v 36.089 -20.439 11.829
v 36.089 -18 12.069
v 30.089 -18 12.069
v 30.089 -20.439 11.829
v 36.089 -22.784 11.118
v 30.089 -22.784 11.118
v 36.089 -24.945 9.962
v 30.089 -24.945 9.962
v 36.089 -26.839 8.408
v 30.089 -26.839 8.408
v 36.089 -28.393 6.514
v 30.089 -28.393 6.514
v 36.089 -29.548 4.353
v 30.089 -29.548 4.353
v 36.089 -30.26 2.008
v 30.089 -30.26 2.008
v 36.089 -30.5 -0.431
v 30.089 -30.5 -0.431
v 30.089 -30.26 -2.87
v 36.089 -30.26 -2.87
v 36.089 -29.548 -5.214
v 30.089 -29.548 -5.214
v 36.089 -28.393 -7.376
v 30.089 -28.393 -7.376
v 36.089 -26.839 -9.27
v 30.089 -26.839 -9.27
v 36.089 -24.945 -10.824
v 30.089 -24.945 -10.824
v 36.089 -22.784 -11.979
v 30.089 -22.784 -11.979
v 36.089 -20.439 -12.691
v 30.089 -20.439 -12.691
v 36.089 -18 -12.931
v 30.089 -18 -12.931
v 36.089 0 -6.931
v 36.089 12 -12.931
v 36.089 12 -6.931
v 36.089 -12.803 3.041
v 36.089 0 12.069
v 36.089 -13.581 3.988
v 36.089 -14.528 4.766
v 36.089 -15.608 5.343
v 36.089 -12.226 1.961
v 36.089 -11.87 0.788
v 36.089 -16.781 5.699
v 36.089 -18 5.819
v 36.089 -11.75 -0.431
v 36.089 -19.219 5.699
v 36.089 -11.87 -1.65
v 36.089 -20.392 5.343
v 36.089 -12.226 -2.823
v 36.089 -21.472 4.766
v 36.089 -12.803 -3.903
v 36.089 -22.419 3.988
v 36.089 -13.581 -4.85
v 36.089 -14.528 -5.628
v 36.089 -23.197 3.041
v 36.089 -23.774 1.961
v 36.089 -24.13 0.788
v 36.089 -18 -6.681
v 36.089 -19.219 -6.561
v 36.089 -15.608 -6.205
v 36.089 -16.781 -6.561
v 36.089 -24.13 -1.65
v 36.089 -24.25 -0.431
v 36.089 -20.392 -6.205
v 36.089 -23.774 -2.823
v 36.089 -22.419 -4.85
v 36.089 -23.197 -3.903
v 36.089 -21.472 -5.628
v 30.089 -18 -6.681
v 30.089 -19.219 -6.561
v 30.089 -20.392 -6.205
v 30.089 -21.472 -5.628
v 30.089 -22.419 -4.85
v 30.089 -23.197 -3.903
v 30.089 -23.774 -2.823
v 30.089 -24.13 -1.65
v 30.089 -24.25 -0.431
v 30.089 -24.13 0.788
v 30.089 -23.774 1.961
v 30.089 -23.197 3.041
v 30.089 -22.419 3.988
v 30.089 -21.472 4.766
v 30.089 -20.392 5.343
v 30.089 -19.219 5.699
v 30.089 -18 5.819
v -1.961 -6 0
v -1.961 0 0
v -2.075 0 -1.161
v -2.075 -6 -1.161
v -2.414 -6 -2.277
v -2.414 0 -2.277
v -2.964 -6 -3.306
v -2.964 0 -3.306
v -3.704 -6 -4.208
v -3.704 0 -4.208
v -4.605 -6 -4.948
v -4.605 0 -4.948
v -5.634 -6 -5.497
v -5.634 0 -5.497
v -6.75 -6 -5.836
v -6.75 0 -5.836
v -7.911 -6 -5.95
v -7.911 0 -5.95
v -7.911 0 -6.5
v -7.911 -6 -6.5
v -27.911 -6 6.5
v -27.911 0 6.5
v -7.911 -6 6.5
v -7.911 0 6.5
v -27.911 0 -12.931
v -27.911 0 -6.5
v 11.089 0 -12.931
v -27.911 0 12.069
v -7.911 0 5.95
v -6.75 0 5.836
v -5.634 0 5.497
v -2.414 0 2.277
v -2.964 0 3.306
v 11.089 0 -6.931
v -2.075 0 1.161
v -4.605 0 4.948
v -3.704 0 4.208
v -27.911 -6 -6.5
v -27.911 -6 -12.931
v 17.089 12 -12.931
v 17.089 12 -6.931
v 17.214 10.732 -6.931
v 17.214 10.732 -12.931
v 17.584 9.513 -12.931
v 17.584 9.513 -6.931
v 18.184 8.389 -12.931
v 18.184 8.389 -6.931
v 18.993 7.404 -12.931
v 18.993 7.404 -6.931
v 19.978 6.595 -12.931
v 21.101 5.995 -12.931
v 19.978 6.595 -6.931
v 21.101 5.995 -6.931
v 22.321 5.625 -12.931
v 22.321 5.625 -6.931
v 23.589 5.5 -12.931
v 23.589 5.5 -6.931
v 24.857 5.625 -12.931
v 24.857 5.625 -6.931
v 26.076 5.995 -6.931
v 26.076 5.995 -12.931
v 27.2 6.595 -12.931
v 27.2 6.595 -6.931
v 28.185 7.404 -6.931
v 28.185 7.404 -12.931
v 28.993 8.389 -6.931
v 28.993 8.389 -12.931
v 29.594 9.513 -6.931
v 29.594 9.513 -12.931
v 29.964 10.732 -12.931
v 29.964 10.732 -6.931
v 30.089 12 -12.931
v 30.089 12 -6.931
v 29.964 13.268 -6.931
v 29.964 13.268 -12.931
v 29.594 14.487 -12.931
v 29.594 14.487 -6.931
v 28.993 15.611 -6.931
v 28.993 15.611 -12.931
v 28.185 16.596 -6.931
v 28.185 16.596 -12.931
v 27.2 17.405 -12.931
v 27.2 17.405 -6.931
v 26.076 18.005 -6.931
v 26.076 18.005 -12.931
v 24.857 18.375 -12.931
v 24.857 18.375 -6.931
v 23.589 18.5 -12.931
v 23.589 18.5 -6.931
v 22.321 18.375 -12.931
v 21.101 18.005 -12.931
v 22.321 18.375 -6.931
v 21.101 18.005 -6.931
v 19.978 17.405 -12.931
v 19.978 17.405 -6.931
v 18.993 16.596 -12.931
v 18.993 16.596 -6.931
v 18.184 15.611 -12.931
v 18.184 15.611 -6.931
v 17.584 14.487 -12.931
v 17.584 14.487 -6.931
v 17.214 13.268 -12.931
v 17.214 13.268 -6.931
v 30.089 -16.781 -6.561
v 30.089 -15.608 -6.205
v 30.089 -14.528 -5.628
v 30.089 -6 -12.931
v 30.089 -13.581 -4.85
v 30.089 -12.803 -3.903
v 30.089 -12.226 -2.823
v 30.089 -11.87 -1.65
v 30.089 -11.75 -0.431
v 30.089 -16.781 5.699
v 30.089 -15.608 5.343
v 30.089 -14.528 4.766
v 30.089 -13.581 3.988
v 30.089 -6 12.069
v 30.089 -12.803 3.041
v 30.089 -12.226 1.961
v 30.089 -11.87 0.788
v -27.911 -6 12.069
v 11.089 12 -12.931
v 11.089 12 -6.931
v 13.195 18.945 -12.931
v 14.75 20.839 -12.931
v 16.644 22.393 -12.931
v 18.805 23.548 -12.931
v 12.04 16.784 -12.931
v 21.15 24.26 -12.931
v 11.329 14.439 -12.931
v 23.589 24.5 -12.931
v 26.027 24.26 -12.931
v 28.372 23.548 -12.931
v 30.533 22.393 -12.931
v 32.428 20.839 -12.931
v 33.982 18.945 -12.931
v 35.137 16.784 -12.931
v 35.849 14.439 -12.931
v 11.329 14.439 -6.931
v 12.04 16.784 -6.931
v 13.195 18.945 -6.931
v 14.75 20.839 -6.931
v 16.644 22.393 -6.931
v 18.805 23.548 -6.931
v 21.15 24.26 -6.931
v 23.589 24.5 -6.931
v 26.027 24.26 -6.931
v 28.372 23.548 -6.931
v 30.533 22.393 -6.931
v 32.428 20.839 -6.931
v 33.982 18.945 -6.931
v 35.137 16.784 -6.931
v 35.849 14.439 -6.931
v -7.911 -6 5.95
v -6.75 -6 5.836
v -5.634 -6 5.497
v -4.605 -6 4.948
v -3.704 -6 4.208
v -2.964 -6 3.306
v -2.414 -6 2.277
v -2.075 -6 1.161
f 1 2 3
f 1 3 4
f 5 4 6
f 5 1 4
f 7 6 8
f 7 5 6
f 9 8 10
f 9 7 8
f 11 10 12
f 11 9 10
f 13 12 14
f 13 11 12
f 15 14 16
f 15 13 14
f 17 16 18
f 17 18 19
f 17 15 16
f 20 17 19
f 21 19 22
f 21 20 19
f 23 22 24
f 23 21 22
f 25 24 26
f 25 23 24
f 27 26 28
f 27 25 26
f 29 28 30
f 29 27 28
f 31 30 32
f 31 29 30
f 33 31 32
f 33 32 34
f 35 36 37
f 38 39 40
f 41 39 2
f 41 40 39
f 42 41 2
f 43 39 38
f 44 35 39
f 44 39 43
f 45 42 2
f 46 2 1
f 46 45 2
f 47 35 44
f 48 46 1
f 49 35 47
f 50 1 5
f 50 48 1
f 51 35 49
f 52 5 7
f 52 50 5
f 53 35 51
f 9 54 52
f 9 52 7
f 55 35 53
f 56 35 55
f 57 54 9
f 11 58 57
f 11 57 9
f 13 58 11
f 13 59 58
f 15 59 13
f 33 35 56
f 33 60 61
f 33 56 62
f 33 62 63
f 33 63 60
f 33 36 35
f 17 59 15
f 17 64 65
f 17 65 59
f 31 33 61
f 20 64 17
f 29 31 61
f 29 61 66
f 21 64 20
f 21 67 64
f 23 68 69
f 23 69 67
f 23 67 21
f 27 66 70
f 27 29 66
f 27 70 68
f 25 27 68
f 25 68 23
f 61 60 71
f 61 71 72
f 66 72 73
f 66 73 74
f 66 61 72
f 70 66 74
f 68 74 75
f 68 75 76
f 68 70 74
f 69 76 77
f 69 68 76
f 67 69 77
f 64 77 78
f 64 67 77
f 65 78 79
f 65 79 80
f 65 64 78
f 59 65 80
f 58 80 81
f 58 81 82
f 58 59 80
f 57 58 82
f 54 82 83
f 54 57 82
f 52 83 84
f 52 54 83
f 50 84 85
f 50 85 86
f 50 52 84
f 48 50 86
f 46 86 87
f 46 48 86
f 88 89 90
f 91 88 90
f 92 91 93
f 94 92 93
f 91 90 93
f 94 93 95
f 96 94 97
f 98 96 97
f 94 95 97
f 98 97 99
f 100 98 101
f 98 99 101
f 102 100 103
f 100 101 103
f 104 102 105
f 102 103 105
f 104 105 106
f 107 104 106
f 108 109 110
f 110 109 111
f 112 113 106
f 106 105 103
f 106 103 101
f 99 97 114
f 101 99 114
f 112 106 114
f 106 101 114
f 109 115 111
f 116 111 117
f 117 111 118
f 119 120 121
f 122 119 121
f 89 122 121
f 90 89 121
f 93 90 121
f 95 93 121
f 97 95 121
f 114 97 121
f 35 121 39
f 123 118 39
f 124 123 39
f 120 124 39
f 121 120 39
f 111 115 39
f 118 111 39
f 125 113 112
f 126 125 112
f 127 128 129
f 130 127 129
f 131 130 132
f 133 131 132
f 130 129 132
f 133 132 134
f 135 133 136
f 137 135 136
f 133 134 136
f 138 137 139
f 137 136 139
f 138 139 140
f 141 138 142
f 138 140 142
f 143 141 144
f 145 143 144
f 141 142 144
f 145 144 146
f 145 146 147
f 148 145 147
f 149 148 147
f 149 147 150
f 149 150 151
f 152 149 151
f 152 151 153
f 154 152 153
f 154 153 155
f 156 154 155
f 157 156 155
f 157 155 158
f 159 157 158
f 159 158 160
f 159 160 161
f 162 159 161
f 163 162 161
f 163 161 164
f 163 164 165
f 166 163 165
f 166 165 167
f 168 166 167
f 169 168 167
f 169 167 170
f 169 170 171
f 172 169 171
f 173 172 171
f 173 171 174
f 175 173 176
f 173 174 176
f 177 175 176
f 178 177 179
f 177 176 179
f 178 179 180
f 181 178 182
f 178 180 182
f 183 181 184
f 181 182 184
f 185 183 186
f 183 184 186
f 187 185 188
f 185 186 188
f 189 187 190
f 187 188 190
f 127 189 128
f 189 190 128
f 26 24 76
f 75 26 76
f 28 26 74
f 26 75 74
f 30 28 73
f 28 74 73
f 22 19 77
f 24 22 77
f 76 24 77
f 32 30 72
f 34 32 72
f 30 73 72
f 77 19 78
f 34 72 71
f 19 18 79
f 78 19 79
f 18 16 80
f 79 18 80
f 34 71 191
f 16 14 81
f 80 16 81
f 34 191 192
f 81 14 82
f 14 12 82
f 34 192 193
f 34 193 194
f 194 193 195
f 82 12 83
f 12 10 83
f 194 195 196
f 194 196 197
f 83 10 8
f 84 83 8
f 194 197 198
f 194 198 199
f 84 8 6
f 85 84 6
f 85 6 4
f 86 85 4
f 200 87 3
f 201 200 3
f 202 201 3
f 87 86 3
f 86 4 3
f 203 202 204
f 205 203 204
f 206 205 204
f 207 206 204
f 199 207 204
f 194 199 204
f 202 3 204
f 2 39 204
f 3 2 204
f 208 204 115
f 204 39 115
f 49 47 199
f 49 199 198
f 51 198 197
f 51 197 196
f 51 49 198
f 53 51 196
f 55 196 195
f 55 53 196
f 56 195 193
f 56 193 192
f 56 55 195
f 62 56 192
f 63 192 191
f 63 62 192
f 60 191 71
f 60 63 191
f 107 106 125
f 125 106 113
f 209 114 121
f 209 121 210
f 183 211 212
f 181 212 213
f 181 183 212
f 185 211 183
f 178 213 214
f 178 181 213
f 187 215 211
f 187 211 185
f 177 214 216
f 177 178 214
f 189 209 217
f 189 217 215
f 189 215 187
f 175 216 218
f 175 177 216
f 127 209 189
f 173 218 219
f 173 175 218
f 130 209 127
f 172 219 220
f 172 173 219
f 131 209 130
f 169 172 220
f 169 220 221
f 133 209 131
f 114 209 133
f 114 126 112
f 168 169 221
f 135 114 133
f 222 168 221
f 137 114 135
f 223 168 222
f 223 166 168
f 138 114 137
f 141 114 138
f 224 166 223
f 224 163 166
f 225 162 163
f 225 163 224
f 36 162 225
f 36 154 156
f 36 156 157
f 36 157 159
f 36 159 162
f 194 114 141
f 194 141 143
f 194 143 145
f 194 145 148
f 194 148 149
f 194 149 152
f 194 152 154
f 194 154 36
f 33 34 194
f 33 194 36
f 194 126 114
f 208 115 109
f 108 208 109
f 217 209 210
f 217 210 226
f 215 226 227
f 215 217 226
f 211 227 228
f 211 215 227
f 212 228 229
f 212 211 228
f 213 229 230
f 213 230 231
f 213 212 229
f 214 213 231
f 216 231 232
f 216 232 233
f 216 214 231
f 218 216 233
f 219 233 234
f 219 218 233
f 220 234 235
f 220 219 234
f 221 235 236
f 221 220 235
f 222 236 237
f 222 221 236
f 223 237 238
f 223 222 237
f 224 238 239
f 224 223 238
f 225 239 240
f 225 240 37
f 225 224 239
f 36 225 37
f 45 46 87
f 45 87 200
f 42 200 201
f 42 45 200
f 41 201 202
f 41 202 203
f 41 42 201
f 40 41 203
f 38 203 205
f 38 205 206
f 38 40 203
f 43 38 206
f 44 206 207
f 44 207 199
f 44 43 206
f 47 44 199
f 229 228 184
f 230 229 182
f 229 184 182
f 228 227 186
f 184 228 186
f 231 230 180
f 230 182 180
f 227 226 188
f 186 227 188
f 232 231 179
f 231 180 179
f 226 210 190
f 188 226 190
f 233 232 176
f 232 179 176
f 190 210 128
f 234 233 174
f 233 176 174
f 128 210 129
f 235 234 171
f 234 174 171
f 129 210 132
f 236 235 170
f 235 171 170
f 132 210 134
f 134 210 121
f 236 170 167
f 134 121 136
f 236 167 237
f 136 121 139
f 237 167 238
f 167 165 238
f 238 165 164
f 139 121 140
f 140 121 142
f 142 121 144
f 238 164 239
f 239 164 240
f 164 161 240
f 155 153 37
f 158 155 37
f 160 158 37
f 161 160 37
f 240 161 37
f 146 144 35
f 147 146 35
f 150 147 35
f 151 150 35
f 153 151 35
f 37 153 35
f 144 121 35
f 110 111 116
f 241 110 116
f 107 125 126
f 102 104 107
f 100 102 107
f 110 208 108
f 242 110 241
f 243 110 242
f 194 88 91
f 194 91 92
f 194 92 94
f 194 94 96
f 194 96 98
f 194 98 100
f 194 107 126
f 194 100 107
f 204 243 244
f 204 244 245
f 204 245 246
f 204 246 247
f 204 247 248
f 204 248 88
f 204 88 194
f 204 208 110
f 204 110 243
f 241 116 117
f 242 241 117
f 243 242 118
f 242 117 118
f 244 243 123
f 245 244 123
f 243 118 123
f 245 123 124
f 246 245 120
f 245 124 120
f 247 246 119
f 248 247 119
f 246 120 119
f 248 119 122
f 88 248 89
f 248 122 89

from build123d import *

# Parameters (mm, degrees)
F1_DEPTH = 6
F3_DEPTH = 6
F4_W     = 25
F4_H     = 12
F4_H_2   = 18
F5_DEPTH = 6
F6_D     = 13


with BuildPart() as f1:
    # F0 (on Front) → F1 (new body)
    with BuildSketch(Plane.XZ):
        with BuildLine():
            Line((36.0888135582, -12.9309209585), (36.0888135582, 12.0690790415))
            Line((36.0888135582, 12.0690790415), (-27.9111864418, 12.0690790415))
            Line((-27.9111864418, 12.0690790415), (-27.9111864418, 6.5))
            Line((-27.9111864418, 6.5), (-7.9111864418, 6.5))
            Line((-7.9111864418, 6.5), (-7.9111864418, 5.9503926081))
            ThreePointArc((-7.9111864418, 5.9503926081), (-3.7036234779, 4.2075629639), (-1.9607938337, 0))
            ThreePointArc((-1.9607938337, 0), (-3.7036234779, -4.2075629639), (-7.9111864418, -5.9503926081))
            Line((-7.9111864418, -5.9503926081), (-7.9111864418, -6.5))
            Line((-7.9111864418, -6.5), (-27.9111864418, -6.5))
            Line((-27.9111864418, -6.5), (-27.9111864418, -12.9309209585))
            Line((-27.9111864418, -12.9309209585), (36.0888135582, -12.9309209585))
        make_face()
    extrude(amount=F1_DEPTH)

    # F2 (on face) → F3 (join)
    with BuildSketch(Plane.YZ.offset(36.0888135582)):
        with BuildLine():
            Line((0, -12.9309209585), (0, 12.0690790415))
            Line((0, 12.0690790415), (-18, 12.0690790415))
            ThreePointArc((-18, 12.0690790415), (-9.1611652352, 8.4079138063), (-5.5, -0.4309209585))
            ThreePointArc((-5.5, -0.4309209585), (-9.1611652352, -9.2697557234), (-18, -12.9309209585))
            Line((-18, -12.9309209585), (0, -12.9309209585))
        make_face()
        with BuildLine():
            ThreePointArc((-5.5, -0.4309209585), (-9.1611652352, 8.4079138063), (-18, 12.0690790415))
            Line((-18, 12.0690790415), (-18, 5.8190790415))
            ThreePointArc((-18, 5.8190790415), (-13.5805826176, 3.9884964239), (-11.75, -0.4309209585))
            ThreePointArc((-11.75, -0.4309209585), (-13.5805826176, -4.8503383409), (-18, -6.6809209585))
            Line((-18, -6.6809209585), (-18, -12.9309209585))
            ThreePointArc((-18, -12.9309209585), (-9.1611652352, -9.2697557234), (-5.5, -0.4309209585))
        make_face()
        with BuildLine():
            Line((-18, 5.8190790415), (-18, 12.0690790415))
            ThreePointArc((-18, 12.0690790415), (-30.5, -0.4309209585), (-18, -12.9309209585))
            Line((-18, -12.9309209585), (-18, -6.6809209585))
            ThreePointArc((-18, -6.6809209585), (-24.25, -0.4309209585), (-18, 5.8190790415))
        make_face()
    extrude(amount=-F3_DEPTH)

    # F4 (on face) → F5 (join)
    with BuildSketch(Plane(origin=(0, 0, -12.9309209585), x_dir=(1, 0, 0), z_dir=(0, 0, -1))):
        with Locations((23.5888135582, -6)):
            Rectangle(F4_W, F4_H)
        with Locations((23.5888135582, -3)):
            Rectangle(F4_W, F4_H_2)
        with BuildLine():
            ThreePointArc((11.0888135582, -12), (23.5888135582, -24.5), (36.0888135582, -12))
            Line((36.0888135582, -12), (11.0888135582, -12))
        make_face()
    extrude(amount=-F5_DEPTH)

    # F6 (through all)
    with Locations(Plane(origin=(0, 0, -12.9309209585), x_dir=(1, 0, 0), z_dir=(0, 0, -1))):
        with Locations((23.5888135582, -12)):
            Hole(F6_D / 2)


solid = f1.part
